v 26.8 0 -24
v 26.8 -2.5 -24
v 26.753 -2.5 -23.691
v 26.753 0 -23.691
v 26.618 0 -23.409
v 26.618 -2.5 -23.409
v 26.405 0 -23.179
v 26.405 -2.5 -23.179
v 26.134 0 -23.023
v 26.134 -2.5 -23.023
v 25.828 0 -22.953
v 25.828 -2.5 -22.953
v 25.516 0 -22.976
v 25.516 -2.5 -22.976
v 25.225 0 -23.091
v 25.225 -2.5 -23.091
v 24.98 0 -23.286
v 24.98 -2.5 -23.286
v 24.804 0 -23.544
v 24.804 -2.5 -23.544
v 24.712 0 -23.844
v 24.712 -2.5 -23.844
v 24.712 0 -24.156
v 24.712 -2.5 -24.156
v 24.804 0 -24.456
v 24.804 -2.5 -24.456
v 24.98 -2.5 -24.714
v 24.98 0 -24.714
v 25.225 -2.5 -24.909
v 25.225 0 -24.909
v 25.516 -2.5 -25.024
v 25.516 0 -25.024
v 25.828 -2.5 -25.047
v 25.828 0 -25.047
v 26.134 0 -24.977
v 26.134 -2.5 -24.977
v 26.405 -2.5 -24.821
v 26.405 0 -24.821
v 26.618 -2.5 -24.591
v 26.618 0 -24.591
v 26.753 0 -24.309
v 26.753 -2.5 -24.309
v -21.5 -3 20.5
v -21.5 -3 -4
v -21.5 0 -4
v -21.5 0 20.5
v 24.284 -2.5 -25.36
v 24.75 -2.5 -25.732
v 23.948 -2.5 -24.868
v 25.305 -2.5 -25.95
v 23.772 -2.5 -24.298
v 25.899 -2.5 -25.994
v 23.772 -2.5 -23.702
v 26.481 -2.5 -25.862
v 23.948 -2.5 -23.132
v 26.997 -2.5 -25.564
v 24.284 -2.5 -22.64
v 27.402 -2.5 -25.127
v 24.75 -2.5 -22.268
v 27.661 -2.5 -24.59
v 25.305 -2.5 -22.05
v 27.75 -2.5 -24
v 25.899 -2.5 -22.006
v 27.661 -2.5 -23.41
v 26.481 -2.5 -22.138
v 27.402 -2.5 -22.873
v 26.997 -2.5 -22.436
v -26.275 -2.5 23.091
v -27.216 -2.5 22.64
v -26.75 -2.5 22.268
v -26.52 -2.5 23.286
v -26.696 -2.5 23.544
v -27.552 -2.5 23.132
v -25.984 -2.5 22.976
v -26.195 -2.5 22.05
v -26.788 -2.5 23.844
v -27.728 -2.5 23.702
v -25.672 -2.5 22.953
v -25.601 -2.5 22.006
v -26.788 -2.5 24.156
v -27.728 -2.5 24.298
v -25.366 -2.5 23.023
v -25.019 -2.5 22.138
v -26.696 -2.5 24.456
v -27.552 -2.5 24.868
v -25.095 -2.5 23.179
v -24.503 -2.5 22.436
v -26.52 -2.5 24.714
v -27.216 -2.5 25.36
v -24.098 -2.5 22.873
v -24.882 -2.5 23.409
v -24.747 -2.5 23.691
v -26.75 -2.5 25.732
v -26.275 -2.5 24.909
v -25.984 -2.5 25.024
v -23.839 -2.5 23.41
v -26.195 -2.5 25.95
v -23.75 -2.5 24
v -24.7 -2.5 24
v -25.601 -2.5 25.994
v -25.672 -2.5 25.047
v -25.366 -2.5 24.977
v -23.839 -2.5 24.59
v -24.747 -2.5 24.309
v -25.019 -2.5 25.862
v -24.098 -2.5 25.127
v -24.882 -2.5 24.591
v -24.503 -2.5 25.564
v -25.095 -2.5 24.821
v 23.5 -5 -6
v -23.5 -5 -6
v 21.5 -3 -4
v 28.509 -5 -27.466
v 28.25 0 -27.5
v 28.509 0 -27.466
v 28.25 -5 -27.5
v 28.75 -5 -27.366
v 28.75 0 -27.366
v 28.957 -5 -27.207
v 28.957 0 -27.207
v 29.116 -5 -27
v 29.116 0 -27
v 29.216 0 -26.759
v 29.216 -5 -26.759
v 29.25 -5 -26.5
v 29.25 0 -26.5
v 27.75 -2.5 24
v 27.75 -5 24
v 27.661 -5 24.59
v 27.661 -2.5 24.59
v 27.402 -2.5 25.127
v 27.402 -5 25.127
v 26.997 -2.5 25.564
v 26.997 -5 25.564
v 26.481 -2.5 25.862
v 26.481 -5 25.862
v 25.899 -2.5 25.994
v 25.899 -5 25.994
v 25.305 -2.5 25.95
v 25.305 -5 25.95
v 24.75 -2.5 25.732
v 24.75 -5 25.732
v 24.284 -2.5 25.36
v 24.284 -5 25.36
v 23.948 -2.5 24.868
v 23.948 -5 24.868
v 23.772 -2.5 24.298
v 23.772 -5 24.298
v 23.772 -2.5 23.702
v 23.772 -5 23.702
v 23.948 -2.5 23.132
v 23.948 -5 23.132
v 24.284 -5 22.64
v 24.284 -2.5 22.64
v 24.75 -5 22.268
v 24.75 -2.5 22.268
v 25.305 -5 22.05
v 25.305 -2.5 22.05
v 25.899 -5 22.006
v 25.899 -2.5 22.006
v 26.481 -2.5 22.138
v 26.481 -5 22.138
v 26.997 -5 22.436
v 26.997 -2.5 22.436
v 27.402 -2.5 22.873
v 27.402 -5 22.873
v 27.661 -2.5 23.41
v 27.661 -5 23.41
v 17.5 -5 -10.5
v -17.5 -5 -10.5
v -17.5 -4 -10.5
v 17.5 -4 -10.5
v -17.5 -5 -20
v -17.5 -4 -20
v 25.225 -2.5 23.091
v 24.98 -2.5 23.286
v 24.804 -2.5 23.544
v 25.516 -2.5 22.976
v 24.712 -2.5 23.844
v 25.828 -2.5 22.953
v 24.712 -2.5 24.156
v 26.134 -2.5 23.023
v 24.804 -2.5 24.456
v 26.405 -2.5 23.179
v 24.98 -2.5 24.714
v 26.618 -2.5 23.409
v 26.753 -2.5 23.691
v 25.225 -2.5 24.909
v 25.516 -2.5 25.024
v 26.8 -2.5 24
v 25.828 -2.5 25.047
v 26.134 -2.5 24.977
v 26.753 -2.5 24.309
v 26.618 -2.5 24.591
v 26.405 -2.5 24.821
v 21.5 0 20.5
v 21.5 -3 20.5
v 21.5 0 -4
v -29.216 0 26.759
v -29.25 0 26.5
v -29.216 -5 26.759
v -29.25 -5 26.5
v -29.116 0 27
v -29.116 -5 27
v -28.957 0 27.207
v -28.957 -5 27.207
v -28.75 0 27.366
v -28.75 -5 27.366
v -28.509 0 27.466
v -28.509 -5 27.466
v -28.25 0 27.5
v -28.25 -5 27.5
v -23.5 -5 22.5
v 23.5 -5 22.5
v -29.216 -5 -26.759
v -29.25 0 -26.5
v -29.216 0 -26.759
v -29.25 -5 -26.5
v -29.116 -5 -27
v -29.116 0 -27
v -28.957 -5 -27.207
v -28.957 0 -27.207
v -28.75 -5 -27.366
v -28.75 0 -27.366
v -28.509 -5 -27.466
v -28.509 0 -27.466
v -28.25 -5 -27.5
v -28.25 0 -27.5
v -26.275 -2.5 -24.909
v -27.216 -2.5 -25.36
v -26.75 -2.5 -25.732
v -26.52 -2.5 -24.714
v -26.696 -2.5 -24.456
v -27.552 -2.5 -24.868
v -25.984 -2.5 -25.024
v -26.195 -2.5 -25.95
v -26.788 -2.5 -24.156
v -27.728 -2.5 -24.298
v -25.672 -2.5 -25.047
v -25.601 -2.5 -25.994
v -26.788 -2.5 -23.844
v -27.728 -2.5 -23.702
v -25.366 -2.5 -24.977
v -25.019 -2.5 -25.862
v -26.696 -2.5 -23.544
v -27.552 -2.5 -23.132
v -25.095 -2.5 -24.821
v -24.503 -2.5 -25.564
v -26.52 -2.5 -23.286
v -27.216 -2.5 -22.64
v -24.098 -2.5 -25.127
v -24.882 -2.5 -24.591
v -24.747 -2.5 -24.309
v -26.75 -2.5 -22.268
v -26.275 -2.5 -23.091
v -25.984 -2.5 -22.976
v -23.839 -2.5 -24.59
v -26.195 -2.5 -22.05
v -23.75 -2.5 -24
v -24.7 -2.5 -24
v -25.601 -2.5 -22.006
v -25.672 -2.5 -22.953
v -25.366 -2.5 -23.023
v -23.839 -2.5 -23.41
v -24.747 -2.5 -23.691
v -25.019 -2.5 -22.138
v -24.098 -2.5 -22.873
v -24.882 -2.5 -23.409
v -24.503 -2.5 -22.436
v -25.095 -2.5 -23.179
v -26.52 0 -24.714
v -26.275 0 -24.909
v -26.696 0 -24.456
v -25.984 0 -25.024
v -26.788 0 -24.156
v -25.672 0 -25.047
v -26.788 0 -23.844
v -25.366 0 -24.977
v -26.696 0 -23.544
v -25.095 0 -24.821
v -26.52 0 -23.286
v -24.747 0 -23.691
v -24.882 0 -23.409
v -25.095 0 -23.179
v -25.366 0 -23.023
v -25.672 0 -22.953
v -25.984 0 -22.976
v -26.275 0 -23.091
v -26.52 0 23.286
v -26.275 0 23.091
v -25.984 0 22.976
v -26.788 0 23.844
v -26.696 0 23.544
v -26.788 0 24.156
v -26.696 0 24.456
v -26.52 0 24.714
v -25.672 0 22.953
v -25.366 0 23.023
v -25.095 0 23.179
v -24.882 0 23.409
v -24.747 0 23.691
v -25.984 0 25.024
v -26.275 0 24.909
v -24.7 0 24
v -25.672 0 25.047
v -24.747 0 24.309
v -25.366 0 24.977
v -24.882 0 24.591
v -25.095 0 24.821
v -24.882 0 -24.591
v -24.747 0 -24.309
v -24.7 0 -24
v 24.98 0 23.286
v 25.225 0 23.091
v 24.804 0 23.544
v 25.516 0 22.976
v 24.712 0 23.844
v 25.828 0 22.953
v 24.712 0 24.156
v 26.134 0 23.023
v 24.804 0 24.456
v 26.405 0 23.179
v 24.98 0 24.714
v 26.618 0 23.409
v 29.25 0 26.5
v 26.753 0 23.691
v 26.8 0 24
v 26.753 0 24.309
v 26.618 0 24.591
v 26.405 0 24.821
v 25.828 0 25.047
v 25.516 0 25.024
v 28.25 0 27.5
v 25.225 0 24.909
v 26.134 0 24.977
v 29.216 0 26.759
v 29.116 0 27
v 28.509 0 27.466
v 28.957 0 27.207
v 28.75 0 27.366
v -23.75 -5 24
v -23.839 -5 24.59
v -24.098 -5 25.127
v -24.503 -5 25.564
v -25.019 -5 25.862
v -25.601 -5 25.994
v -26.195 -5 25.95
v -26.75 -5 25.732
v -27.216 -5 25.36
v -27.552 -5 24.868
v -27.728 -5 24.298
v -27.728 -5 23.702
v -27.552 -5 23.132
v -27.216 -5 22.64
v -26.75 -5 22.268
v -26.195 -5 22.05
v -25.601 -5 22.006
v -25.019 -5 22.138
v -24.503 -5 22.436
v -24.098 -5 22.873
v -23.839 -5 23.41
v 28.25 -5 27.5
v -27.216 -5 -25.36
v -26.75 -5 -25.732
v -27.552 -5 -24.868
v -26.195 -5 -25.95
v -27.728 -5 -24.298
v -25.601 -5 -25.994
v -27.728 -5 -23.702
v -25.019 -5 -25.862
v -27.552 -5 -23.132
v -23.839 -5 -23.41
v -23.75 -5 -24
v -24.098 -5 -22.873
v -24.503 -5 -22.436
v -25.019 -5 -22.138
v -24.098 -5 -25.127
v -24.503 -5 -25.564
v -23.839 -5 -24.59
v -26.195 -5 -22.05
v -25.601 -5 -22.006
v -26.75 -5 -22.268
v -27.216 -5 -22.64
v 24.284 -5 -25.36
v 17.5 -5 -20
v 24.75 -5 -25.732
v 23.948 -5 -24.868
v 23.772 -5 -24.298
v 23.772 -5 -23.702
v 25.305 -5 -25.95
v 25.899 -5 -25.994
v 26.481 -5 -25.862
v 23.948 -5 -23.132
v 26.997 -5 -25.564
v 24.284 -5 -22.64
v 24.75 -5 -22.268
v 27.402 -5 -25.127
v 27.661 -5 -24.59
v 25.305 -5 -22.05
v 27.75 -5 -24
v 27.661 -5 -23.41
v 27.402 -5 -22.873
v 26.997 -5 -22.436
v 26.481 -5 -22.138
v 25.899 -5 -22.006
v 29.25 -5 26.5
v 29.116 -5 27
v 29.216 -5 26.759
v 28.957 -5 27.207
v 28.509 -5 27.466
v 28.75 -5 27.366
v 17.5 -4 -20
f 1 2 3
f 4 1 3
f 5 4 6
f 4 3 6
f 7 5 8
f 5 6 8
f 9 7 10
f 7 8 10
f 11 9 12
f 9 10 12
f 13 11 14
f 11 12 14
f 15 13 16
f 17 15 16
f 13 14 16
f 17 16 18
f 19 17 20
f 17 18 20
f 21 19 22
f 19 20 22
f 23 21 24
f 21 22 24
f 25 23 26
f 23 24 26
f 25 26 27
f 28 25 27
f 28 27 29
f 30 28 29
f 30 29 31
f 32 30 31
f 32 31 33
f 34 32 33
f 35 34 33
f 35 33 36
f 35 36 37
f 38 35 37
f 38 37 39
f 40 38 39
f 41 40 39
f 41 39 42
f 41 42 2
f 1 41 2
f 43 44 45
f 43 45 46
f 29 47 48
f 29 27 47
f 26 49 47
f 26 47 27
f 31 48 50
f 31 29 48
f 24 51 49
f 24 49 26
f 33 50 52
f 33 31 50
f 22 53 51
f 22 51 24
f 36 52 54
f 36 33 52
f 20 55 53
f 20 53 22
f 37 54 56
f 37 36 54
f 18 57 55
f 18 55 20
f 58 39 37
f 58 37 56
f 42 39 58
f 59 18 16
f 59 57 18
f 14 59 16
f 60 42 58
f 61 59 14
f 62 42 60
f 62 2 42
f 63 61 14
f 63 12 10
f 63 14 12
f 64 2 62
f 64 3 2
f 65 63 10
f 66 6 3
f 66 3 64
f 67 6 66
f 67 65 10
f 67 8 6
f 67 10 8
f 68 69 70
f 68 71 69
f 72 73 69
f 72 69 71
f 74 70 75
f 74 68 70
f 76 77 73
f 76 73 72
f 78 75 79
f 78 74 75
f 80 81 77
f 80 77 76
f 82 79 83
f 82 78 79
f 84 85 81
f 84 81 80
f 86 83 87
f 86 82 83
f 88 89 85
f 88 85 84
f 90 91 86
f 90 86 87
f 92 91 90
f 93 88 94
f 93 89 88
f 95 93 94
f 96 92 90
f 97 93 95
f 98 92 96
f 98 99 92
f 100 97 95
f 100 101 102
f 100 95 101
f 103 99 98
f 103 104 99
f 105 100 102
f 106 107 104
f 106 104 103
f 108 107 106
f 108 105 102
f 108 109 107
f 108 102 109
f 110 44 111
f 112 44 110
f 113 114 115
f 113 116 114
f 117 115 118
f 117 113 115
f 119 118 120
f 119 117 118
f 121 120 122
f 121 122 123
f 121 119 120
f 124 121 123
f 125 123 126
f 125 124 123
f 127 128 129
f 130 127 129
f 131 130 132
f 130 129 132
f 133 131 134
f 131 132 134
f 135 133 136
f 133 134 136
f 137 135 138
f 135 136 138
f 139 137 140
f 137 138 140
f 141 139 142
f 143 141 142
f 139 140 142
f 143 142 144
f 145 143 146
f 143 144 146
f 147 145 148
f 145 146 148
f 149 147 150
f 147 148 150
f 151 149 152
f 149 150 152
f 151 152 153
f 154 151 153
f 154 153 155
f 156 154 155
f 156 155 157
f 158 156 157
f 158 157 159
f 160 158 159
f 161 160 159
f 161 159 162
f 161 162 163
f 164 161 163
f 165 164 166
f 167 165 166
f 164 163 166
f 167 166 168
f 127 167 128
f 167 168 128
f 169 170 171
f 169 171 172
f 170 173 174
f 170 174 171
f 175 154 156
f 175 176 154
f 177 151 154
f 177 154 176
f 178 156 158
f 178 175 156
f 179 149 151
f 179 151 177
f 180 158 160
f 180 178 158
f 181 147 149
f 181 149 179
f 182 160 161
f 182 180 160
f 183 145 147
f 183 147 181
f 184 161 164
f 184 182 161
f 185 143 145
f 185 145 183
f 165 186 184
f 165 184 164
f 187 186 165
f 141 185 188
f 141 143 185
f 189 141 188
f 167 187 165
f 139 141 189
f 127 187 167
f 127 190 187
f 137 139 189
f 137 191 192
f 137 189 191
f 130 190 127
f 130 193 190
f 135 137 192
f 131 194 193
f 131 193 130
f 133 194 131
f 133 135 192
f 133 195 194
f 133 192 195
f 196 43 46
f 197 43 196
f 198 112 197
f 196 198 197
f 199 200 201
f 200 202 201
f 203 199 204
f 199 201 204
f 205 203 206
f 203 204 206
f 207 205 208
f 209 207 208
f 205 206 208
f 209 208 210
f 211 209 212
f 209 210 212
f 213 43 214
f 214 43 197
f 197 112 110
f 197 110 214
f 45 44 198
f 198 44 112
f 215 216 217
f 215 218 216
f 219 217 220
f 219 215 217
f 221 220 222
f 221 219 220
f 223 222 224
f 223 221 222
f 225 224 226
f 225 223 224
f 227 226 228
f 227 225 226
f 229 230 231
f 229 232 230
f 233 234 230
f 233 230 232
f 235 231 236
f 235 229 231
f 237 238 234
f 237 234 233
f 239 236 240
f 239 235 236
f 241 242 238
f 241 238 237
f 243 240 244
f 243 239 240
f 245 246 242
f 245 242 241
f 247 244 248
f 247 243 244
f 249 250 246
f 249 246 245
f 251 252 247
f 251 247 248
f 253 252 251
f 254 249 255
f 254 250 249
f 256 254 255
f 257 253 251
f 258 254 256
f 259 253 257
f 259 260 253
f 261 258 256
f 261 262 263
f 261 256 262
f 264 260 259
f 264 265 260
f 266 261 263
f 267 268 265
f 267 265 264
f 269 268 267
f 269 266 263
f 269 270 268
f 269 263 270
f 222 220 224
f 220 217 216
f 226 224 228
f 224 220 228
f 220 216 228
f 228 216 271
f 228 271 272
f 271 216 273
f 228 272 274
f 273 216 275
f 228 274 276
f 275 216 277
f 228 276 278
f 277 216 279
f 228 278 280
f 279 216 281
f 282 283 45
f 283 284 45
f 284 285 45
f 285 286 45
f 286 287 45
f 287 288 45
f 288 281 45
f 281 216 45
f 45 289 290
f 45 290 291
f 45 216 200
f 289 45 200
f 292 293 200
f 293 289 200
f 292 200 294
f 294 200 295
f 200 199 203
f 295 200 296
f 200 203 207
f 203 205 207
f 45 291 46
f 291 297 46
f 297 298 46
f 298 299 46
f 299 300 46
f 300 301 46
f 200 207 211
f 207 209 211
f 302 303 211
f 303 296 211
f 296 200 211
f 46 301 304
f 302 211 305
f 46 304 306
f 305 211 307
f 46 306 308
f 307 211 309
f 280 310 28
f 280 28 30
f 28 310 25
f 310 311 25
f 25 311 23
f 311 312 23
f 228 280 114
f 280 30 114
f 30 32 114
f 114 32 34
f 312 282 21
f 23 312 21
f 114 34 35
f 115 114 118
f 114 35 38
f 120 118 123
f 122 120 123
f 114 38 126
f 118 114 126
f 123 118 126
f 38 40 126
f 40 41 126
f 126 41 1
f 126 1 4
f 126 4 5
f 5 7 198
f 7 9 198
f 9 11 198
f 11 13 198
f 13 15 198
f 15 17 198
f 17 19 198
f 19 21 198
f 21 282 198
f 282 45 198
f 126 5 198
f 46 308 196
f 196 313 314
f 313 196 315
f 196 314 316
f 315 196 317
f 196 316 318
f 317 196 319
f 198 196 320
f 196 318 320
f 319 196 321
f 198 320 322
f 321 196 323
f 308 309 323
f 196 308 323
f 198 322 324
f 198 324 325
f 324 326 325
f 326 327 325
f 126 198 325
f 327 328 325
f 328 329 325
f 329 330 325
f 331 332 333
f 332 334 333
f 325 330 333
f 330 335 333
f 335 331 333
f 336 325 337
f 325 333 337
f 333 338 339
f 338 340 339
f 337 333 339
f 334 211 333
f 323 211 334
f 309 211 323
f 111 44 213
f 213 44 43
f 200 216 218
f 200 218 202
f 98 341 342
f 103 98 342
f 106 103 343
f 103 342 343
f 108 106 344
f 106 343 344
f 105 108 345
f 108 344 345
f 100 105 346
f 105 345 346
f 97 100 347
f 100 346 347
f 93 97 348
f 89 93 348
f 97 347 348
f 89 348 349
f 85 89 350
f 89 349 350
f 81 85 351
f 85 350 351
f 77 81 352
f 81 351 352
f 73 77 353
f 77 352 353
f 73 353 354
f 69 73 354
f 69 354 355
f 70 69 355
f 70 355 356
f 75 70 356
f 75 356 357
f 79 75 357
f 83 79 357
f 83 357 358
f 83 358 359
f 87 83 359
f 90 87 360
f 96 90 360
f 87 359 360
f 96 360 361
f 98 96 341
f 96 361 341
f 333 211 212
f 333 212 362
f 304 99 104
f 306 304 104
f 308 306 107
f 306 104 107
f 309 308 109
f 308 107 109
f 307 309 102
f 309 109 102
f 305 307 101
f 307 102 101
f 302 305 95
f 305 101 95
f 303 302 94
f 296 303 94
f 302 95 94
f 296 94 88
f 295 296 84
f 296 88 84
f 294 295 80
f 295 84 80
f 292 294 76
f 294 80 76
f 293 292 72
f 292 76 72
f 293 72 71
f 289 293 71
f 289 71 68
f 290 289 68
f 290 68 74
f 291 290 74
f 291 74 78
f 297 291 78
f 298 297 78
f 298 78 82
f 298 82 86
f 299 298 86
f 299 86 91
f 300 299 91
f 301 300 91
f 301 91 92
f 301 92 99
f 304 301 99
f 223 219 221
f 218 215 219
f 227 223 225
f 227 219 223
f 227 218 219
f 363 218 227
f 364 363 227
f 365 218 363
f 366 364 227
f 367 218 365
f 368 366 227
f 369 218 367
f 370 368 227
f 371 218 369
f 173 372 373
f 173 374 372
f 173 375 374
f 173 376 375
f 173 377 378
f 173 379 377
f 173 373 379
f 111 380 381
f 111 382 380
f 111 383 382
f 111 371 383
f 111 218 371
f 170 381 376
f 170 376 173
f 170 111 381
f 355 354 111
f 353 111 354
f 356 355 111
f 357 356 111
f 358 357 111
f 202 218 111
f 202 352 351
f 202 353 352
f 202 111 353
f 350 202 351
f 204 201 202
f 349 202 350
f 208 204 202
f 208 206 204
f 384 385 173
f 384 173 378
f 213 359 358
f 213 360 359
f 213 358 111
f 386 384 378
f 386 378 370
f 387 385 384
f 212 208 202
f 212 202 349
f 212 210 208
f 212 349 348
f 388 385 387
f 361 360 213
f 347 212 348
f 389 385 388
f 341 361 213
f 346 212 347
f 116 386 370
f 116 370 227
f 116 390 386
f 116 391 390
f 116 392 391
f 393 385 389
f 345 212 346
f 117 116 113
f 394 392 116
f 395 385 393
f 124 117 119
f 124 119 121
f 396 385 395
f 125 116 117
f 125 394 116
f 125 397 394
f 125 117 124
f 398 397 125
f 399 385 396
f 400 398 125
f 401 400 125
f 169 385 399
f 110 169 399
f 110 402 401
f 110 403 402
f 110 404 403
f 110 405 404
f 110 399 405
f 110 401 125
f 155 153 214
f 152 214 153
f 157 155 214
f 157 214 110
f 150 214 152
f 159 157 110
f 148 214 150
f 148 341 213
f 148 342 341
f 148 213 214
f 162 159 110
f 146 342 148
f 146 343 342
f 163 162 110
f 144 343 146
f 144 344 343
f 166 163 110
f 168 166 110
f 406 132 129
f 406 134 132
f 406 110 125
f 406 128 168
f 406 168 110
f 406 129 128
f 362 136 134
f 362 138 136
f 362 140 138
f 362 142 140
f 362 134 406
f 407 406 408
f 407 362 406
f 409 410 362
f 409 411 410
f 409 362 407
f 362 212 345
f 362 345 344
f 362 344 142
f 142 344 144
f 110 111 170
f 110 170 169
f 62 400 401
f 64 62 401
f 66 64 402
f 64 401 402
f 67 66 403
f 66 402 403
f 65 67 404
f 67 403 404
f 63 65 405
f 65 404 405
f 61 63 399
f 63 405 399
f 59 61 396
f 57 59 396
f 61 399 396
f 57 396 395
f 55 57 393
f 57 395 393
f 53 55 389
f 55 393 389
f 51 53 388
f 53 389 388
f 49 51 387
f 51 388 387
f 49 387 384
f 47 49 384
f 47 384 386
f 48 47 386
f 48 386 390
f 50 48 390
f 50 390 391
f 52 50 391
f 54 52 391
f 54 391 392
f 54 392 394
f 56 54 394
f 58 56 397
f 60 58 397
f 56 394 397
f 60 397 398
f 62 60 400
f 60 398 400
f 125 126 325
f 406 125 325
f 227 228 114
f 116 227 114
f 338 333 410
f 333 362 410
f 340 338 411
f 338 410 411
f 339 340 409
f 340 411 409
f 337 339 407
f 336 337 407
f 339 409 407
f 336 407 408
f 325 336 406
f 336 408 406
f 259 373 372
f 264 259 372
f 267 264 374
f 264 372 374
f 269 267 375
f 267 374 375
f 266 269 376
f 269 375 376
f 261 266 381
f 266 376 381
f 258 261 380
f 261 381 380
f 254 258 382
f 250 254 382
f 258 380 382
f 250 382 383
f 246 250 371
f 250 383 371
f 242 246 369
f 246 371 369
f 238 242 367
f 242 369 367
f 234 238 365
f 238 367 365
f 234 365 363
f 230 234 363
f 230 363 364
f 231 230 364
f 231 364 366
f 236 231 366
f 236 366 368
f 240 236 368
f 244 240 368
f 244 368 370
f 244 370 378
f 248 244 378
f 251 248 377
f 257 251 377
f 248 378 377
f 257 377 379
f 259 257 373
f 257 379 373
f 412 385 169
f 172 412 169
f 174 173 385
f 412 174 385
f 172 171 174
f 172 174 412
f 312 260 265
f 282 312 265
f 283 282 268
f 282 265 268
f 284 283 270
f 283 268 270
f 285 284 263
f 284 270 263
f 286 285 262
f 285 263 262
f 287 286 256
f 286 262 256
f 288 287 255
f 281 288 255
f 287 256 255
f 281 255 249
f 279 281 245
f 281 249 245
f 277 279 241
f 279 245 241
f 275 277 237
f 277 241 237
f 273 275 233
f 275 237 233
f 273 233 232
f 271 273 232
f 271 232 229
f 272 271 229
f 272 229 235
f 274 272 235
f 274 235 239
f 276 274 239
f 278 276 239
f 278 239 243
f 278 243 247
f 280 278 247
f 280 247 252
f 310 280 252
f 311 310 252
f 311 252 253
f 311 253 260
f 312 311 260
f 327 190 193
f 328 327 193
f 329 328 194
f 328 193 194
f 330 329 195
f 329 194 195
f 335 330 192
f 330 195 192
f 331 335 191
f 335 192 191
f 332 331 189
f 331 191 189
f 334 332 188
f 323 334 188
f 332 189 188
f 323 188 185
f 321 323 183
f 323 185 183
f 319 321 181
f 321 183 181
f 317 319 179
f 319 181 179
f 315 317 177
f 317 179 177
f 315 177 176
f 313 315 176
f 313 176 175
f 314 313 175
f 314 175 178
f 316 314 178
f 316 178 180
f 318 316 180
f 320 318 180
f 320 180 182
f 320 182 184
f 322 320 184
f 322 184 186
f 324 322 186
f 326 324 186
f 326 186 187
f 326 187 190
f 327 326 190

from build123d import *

# Parameters (mm, degrees)
SKETCH_W        = 58.5
SKETCH_H        = 55
PAD004_DEPTH    = 5
SKETCH005_W     = 43
SKETCH005_H     = 24.5
POCKET_DEPTH    = 5
CHAMFER_SIZE    = 2
SKETCH006_R     = 2
POCKET001_DEPTH = 2.5
SKETCH007_R     = 1.05
POCKET002_DEPTH = 5
SKETCH008_W     = 35
SKETCH008_H     = 9.5
POCKET003_DEPTH = 1
FILLET002_R     = 1


with BuildPart() as part:
    # Sketch → Pad004 (new body)
    with BuildSketch(Plane.XZ):
        Rectangle(SKETCH_W, SKETCH_H)
    extrude(amount=PAD004_DEPTH)

    # Sketch005 (on Face6 of Pad004) → Pocket (cut)
    with BuildSketch(Plane.XZ.offset(5)):
        with Locations((0, 8.25)):
            Rectangle(SKETCH005_W, SKETCH005_H)
    extrude(amount=-POCKET_DEPTH, mode=Mode.SUBTRACT)

    # Chamfer
    chamfer_edges = [part.edges().sort_by_distance(p)[0] for p in [
        (-21.5, -5, 8.25),
        (0, -5, 20.5),
        (0, -5, -4),
        (21.5, -5, 8.25),
    ]]
    chamfer(chamfer_edges, length=CHAMFER_SIZE)

    # Sketch006 (on Face1 of Chamfer) → Pocket001 (cut)
    with BuildSketch(Plane.XZ.offset(5)):
        with Locations((-25.75, 24)):
            Circle(SKETCH006_R)
        with Locations((25.75, 24)):
            Circle(SKETCH006_R)
        with Locations((-25.75, -24)):
            Circle(SKETCH006_R)
        with Locations((25.75, -24)):
            Circle(SKETCH006_R)
    extrude(amount=-POCKET001_DEPTH, mode=Mode.SUBTRACT)

    # Sketch007 (on Face16 of Pocket001) → Pocket002 (cut)
    with BuildSketch(Plane.XZ.offset(2.5)):
        with Locations((-25.75, 24)):
            Circle(SKETCH007_R)
        with Locations((25.75, 24)):
            Circle(SKETCH007_R)
        with Locations((25.75, -24)):
            Circle(SKETCH007_R)
        with Locations((-25.75, -24)):
            Circle(SKETCH007_R)
    extrude(amount=-POCKET002_DEPTH, mode=Mode.SUBTRACT)

    # Sketch008 (on Face1 of Pocket002) → Pocket003 (cut)
    with BuildSketch(Plane.XZ.offset(5)):
        with Locations((0, -15.25)):
            Rectangle(SKETCH008_W, SKETCH008_H)
    extrude(amount=-POCKET003_DEPTH, mode=Mode.SUBTRACT)

    # Fillet002
    fillet002_edges = [part.edges().sort_by_distance(p)[0] for p in [
        (29.25, -2.5, 27.5),
        (-29.25, -2.5, 27.5),
        (29.25, -2.5, -27.5),
        (-29.25, -2.5, -27.5),
    ]]
    fillet(fillet002_edges, radius=FILLET002_R)


solid = part.part
